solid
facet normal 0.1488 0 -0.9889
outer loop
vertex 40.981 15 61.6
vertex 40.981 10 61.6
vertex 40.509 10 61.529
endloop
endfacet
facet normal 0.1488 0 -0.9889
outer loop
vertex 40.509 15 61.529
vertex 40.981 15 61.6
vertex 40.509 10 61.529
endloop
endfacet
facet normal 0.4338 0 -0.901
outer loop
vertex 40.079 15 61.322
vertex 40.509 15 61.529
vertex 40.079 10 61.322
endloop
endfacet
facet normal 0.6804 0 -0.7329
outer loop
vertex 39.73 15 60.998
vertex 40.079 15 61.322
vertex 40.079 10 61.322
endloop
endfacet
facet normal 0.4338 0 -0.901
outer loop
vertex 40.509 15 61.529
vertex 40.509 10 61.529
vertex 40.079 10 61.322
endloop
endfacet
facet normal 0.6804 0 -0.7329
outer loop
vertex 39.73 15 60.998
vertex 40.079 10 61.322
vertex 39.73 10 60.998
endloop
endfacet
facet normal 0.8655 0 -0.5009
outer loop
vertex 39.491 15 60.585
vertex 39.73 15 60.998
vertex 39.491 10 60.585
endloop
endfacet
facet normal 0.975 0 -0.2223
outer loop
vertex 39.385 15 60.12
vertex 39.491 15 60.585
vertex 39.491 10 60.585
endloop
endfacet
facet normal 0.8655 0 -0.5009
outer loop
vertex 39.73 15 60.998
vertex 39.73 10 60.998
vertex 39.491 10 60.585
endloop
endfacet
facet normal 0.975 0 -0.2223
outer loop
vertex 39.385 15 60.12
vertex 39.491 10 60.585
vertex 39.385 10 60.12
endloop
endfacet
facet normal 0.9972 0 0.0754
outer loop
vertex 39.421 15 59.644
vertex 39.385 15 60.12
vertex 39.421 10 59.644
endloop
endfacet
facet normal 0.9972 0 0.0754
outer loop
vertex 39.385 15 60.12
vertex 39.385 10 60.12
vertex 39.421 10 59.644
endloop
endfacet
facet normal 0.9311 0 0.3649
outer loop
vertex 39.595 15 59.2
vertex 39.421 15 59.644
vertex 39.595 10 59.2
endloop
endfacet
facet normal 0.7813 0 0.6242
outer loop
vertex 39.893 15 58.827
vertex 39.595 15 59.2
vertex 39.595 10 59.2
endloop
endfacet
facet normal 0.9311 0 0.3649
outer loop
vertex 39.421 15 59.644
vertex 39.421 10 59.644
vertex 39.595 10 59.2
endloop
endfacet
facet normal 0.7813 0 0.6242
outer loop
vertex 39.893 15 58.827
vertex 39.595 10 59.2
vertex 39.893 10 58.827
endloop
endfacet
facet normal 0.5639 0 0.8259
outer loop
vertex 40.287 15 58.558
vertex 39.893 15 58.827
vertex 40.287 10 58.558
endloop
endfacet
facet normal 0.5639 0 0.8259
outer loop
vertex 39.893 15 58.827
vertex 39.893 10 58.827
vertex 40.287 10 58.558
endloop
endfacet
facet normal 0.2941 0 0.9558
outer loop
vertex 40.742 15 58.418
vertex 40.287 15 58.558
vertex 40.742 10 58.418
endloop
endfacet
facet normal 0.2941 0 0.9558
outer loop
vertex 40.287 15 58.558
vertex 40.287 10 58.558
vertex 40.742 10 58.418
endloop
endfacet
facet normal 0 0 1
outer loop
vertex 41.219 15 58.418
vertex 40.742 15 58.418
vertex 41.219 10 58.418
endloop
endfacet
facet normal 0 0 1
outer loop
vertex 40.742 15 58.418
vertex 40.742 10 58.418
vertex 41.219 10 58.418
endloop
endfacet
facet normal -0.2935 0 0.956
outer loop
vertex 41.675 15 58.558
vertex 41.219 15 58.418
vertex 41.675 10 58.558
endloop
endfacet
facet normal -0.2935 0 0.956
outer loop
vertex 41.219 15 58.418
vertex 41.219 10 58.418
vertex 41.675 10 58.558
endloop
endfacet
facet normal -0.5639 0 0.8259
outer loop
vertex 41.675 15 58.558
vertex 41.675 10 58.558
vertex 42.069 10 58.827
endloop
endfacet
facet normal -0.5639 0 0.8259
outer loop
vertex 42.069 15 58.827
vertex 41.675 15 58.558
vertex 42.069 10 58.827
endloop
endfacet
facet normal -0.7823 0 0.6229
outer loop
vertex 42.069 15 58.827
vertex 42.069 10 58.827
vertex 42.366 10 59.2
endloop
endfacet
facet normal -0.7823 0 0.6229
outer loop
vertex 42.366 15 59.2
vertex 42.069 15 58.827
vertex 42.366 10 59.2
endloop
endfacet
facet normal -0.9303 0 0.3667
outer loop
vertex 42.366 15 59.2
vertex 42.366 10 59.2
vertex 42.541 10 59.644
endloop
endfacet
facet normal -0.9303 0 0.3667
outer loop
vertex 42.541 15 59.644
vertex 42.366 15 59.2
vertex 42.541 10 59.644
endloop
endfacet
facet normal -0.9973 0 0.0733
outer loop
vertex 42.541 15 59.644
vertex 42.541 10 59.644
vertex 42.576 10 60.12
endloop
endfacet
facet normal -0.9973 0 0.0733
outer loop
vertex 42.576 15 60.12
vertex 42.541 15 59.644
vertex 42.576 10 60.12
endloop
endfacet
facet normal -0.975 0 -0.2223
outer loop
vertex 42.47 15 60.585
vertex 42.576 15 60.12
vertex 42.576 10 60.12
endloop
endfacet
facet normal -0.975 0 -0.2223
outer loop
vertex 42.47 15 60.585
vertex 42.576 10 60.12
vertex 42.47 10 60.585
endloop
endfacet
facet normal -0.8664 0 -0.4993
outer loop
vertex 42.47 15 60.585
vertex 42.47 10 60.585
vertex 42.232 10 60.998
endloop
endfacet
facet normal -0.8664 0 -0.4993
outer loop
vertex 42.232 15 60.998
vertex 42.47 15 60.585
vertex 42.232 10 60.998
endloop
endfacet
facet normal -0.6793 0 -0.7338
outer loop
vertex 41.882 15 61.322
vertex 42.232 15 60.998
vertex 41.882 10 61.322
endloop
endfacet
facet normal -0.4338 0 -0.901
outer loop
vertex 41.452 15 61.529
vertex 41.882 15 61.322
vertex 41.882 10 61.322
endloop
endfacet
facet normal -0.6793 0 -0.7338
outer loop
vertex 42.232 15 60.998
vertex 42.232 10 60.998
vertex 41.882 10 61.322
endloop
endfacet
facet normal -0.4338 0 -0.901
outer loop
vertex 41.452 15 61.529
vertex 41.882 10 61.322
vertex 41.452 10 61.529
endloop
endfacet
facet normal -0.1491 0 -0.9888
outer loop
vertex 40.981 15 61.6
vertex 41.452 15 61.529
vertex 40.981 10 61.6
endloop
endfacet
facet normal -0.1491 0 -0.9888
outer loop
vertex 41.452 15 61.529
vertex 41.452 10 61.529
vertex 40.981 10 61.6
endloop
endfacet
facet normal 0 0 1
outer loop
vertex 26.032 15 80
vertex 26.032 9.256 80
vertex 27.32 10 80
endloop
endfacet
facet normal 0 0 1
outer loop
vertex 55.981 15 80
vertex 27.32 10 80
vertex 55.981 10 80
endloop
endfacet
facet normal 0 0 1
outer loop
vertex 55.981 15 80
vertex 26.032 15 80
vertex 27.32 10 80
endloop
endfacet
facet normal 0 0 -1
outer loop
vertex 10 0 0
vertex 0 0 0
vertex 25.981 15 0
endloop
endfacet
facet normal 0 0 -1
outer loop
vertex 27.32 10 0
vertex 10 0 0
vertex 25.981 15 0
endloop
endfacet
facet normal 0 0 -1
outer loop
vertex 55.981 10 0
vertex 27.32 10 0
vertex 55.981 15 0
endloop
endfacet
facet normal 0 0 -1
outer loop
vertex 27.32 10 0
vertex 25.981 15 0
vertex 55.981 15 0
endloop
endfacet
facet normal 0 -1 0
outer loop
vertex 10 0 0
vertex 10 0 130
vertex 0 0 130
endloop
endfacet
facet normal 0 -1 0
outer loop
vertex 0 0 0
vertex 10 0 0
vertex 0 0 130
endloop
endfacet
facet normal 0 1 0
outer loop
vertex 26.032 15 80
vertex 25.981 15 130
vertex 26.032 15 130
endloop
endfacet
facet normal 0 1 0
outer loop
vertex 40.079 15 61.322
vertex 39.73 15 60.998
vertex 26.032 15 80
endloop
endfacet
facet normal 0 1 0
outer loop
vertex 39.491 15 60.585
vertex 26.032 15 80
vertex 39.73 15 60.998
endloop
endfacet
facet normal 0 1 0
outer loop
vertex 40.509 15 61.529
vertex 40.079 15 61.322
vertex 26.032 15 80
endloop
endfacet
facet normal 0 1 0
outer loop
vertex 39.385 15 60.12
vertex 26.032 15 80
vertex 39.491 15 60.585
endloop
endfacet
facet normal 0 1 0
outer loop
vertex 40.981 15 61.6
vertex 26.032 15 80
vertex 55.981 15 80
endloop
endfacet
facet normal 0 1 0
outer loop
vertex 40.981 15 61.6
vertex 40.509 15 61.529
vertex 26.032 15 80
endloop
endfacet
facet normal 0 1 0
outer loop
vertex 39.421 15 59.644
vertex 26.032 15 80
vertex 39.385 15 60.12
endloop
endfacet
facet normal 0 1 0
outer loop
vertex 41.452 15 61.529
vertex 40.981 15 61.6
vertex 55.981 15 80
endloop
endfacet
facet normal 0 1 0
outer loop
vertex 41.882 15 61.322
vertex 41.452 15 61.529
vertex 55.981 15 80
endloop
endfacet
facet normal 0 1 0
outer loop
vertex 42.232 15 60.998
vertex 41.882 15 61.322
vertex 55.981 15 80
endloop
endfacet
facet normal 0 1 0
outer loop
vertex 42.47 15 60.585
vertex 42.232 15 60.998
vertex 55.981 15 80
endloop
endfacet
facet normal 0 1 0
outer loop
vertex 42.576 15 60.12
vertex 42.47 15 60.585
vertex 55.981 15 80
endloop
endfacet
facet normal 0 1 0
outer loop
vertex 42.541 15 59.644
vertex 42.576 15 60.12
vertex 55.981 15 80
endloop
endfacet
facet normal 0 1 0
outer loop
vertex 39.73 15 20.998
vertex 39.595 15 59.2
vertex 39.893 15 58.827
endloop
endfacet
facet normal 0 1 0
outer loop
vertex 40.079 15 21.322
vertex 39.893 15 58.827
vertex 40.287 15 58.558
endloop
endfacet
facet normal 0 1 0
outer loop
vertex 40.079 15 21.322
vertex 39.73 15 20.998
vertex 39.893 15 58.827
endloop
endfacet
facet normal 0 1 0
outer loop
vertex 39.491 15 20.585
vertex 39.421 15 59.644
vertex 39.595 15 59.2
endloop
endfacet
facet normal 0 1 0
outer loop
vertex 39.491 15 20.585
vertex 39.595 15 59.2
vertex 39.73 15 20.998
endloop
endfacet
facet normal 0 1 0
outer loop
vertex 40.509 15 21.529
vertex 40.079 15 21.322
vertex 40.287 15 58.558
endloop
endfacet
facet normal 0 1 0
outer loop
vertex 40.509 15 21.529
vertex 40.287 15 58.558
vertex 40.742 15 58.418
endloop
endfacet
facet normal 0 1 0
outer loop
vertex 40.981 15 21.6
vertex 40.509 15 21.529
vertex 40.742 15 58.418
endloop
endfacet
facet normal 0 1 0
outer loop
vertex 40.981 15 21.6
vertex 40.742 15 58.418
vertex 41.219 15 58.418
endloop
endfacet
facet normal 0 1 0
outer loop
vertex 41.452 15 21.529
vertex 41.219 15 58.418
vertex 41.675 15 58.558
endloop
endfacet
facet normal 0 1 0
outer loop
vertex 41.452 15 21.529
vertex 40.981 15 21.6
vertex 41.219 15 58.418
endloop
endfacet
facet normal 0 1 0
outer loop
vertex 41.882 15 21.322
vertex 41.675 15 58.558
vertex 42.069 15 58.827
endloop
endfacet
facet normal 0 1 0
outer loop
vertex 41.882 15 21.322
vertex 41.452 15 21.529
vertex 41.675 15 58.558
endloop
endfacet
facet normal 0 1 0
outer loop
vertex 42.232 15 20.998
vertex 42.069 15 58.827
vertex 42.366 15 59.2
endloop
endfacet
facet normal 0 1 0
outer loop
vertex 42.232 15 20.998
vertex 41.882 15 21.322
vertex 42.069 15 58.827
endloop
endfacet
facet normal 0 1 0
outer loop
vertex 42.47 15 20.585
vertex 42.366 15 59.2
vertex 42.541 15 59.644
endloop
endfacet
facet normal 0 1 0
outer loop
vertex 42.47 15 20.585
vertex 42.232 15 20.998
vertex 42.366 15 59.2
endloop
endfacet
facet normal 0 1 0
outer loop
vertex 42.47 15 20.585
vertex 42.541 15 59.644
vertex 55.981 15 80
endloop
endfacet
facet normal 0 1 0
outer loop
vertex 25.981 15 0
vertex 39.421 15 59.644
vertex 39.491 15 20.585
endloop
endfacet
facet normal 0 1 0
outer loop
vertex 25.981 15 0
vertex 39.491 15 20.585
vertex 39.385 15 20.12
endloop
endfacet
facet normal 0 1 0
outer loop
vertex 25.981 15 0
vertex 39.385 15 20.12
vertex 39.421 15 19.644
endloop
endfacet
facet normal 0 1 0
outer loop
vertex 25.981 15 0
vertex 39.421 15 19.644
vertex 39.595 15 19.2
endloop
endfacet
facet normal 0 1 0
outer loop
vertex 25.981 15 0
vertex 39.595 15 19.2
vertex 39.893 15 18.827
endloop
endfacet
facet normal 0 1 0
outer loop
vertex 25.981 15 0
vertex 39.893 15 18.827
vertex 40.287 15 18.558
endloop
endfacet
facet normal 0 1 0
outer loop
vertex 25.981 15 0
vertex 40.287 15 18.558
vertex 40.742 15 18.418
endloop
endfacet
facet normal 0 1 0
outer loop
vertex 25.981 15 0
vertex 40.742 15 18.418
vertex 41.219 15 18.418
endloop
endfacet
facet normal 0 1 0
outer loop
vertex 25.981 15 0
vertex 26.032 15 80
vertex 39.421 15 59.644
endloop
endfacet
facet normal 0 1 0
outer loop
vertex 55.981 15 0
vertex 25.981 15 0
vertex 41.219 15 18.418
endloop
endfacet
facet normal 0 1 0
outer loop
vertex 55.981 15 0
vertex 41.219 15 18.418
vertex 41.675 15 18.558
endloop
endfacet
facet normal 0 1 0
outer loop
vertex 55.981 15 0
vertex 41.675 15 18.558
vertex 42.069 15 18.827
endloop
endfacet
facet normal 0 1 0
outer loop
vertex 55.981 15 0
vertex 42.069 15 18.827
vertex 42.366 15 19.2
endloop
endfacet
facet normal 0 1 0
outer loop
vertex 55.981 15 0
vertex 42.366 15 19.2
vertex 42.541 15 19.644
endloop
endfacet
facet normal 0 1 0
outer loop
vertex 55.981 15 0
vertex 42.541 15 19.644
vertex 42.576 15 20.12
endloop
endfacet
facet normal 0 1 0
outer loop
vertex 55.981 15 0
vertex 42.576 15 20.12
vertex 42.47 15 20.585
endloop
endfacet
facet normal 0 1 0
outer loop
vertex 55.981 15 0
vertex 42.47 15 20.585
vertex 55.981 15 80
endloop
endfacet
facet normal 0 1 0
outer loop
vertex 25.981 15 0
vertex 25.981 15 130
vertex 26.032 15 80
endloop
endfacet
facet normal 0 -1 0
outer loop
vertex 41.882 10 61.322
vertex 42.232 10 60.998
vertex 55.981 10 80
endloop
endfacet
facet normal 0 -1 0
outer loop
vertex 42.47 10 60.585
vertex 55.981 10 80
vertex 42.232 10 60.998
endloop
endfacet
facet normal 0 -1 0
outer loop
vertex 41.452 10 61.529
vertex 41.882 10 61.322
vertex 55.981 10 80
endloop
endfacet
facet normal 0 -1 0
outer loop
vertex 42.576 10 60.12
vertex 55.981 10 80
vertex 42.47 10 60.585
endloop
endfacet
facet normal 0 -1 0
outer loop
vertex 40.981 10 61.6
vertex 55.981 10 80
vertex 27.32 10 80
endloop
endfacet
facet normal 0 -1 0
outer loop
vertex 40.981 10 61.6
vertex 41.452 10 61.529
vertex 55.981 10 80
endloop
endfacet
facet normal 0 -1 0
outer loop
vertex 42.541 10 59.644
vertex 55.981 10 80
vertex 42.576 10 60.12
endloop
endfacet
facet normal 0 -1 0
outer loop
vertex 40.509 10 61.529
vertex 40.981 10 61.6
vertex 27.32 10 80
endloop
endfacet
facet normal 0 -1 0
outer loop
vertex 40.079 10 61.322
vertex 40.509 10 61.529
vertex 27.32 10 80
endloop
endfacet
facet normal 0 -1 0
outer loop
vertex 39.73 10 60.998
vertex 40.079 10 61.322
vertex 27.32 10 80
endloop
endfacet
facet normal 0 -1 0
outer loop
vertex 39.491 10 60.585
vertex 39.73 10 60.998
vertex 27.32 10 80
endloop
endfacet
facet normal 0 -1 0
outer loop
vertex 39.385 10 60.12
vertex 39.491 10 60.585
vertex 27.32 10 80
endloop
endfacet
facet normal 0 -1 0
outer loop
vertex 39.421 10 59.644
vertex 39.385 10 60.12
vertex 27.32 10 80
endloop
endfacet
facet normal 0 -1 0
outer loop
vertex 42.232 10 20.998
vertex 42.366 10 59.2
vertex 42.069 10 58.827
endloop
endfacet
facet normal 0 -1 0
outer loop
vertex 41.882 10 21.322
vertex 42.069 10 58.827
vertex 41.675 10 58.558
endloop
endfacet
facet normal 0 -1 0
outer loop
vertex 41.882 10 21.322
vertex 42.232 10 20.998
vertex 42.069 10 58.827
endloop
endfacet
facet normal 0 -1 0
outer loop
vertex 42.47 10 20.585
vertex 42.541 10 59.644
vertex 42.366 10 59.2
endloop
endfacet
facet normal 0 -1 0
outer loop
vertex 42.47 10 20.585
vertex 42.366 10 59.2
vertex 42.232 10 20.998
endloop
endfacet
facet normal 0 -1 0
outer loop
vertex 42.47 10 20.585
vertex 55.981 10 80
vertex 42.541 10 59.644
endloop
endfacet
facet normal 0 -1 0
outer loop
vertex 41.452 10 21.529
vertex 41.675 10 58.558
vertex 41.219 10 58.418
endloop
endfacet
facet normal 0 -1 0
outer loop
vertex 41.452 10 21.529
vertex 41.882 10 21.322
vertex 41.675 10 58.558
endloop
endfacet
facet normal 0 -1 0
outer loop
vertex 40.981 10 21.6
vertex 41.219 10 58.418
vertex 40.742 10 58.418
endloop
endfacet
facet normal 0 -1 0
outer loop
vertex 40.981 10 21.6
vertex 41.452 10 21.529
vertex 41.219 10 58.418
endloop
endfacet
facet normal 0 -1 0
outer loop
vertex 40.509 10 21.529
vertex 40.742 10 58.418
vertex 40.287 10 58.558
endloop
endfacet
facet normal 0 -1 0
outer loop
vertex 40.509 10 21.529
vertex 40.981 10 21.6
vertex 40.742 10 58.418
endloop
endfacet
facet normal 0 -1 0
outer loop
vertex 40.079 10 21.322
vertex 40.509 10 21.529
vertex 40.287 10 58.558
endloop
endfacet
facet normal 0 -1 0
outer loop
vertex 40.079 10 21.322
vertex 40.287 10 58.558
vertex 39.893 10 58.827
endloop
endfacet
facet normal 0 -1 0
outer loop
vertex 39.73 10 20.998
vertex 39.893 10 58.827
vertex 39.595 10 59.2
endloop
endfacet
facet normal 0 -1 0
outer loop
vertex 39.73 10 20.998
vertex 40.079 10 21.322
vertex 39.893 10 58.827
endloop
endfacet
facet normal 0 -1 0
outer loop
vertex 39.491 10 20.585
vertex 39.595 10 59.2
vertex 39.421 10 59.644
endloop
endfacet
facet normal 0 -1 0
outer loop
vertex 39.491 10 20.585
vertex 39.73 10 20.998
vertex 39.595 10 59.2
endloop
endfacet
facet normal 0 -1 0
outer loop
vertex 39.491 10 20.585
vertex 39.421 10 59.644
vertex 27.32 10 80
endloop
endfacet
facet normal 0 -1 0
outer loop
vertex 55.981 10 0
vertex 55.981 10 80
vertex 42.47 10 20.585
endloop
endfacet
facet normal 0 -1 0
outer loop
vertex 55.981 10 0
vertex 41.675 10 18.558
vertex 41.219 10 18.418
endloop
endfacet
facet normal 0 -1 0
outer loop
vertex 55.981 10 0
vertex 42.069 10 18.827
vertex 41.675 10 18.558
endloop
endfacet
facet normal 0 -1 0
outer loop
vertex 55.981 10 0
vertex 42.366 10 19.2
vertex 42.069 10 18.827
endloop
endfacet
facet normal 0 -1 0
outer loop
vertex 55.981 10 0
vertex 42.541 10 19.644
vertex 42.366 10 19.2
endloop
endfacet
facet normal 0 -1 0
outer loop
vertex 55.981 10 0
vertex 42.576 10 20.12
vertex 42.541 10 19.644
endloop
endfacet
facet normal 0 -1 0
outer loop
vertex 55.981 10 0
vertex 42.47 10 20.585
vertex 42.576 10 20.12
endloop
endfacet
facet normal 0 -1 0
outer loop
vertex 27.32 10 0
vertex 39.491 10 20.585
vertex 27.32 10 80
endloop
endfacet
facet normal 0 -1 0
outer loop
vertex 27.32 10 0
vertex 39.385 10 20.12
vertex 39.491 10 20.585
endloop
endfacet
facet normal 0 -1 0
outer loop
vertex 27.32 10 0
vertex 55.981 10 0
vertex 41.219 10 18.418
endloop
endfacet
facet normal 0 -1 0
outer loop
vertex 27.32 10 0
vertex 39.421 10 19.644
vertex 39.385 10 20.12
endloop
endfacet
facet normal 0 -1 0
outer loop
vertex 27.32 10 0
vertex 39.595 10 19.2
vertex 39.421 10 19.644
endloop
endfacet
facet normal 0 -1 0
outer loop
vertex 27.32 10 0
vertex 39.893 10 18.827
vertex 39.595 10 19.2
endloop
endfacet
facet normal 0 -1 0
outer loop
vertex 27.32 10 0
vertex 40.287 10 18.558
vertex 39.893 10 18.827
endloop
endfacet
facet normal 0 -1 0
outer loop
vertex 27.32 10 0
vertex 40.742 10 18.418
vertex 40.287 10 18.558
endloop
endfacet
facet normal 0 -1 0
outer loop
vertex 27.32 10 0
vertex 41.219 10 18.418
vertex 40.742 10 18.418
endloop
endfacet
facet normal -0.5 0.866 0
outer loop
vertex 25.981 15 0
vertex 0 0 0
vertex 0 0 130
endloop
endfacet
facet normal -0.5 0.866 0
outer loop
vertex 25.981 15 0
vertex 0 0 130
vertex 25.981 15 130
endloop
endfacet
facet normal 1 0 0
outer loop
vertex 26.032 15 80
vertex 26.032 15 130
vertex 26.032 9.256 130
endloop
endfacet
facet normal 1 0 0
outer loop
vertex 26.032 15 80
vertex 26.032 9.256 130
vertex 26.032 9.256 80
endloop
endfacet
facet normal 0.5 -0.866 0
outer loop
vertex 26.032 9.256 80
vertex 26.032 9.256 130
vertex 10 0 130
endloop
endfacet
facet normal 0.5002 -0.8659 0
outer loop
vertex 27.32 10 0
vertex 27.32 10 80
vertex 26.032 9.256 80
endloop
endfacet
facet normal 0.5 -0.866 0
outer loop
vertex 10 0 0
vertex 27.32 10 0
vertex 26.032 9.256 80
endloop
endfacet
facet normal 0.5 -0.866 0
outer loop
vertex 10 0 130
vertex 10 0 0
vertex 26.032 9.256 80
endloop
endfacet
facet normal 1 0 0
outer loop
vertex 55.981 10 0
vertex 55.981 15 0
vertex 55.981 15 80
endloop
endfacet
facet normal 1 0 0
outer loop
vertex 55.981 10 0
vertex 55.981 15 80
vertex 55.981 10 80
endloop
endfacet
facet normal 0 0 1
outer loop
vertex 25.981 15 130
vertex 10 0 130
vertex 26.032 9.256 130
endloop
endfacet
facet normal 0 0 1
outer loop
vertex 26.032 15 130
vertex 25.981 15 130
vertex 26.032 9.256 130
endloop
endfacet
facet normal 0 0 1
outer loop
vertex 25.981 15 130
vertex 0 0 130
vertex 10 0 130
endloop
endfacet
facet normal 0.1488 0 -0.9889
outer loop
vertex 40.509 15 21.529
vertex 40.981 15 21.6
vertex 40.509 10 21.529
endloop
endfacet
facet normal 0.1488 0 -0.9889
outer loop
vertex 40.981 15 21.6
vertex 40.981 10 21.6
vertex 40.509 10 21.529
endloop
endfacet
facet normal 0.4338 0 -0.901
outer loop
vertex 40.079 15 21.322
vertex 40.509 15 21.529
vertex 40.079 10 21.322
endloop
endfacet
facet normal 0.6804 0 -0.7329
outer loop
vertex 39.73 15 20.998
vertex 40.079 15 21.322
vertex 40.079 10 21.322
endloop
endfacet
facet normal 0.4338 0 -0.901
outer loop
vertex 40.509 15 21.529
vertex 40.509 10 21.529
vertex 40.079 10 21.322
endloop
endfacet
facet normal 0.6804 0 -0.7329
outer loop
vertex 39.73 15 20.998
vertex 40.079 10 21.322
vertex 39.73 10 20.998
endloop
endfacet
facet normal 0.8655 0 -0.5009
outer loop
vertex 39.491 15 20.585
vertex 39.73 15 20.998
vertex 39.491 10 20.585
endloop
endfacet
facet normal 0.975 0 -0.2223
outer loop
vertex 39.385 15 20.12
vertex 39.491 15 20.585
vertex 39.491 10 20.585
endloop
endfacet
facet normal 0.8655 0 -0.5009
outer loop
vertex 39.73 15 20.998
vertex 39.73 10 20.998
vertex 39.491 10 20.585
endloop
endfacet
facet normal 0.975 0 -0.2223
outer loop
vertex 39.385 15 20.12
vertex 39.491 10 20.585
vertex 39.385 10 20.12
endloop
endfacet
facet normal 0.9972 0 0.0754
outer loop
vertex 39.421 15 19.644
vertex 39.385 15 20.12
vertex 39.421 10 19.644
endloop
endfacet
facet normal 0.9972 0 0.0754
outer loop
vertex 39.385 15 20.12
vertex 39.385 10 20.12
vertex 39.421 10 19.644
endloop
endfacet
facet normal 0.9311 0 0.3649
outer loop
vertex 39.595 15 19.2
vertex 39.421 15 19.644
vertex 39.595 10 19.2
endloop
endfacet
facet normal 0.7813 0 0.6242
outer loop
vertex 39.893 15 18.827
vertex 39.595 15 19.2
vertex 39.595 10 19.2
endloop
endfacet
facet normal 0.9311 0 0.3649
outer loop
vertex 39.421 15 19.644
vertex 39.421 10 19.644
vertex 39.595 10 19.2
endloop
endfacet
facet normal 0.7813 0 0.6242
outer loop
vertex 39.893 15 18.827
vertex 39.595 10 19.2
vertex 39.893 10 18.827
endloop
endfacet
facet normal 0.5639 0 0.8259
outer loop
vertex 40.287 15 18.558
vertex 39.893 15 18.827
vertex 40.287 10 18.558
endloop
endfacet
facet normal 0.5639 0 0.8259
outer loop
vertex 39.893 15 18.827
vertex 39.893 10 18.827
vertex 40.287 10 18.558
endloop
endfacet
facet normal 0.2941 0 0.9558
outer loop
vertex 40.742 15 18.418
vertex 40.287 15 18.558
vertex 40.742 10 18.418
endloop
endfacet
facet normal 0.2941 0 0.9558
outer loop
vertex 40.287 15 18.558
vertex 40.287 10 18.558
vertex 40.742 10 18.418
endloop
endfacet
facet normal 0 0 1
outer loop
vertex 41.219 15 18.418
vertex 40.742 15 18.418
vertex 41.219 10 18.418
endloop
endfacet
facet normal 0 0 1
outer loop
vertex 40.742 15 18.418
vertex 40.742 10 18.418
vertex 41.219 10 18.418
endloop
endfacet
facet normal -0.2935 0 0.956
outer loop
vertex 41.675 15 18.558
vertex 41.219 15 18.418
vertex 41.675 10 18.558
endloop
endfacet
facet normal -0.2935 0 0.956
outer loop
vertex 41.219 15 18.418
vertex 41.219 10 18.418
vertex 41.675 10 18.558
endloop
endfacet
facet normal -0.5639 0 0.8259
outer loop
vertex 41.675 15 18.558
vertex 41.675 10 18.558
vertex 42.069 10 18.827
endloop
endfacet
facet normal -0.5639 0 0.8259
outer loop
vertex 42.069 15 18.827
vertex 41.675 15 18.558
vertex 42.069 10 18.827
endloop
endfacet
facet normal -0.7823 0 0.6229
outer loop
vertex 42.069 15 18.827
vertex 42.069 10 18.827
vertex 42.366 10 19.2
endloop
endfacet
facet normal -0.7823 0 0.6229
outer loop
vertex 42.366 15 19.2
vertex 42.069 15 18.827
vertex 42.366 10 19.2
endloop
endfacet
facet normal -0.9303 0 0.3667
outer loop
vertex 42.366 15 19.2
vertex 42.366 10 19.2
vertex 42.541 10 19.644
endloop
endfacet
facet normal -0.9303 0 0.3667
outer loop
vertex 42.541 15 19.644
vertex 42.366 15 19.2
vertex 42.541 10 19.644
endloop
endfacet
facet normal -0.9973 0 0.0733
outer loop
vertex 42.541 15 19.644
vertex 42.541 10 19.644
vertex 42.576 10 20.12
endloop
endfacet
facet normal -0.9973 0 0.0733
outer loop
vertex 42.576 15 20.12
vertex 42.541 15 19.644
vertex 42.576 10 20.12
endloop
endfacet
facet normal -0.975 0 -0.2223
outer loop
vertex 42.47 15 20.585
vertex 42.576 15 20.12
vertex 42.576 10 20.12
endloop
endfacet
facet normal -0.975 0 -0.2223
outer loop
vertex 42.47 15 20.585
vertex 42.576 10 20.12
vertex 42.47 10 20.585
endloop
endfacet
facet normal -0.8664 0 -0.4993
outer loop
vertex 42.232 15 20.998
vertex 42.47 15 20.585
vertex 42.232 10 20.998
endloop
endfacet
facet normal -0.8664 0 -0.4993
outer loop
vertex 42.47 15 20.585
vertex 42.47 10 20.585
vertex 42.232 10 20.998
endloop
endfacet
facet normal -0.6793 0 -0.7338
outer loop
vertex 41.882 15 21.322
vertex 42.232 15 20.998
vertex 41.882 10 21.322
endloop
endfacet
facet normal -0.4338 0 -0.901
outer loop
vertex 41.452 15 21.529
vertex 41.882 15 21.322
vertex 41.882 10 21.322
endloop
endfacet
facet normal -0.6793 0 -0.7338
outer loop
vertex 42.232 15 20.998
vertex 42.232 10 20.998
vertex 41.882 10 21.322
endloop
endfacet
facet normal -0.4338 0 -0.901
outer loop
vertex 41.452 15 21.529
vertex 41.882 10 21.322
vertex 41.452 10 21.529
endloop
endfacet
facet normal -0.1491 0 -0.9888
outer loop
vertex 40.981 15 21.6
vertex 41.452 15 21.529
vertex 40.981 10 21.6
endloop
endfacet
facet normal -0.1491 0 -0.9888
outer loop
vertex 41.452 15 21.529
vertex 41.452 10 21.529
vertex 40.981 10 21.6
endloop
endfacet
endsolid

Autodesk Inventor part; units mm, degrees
ref_plane "YZ Plane" through (0, 0, 0) normal (1, 0, 0) x (0, 1, 0)
ref_plane "XZ Plane" through (0, 0, 0) normal (0, 1, 0) x (-1, 0, 0)
ref_plane "XY Plane" through (0, 0, 0) normal (0, 0, 1) x (1, 0, 0)
sketch "スケッチ1" plane through (0, 0, 0) normal (0, 0, 1) x (1, 0, 0)
  line L0 (0, 0) -> (25.9808, 15)
  line L1 (25.9808, 15) -> (55.9808, 15)
  line L2 (55.9808, 15) -> (55.9808, 10)
  line L3 (55.9808, 10) -> (27.3205, 10)
  line L4 (27.3205, 10) -> (10, 0)
  line L5 (10, 0) -> (0, 0)
  dimension "d0" = 15
  dimension "d1" = 5
  dimension "d2" = 5
  dimension "d3" = 30
  dimension "d21" = 30
extrude "押し出し1" add sketch "スケッチ1" along normal blind 130
sketch "スケッチ2" plane through (25.9808, 15, 0) normal (0, 1, 0) x (1, 0, 0)
  line L0 (0.0508, -80) -> (34.0508, -80)
  line L1 (34.0508, -80) -> (34.0508, -130.8394)
  line L2 (34.0508, -130.8394) -> (0.0508, -130.8394)
  line L3 (0.0508, -130.8394) -> (0.0508, -80)
  line L4 (30, 0) -> (0, 0) projected
  line L5 (30, -130) -> (0, -130) projected
  point P0 (-25.9808, 0)
  point P1 (15, 0)
  point P2 (17.0508, -130.8394)
  point P3 (15, -130)
  dimension "d7" = 80
  dimension "d22" = 34
extrude "押し出し2" cut sketch "スケッチ2" against normal blind 300
sketch "スケッチ3" plane through (25.9808, 15, 0) normal (0, 1, 0) x (1, 0, 0)
  line L0 (30, 0) -> (30, -130) projected
  line L1 (30, 0) -> (0, 0) projected
  line L2 (30, -130) -> (0, -130) projected
  point P0 (-25.9808, 0)
  point P1 (15, -20)
  point P2 (30, -80)
  point P3 (15, -60)
  point P4 (15, -130)
  dimension "d12" = 15
  dimension "d13" = 20
  dimension "d23" = 40
hole "穴1" at (40.9808, 15, 20) at (40.9808, 15, 60) direction (0, -1, 0) diameter 3.2 depth 10 tip angle 118
properties part number "バンパー1"
